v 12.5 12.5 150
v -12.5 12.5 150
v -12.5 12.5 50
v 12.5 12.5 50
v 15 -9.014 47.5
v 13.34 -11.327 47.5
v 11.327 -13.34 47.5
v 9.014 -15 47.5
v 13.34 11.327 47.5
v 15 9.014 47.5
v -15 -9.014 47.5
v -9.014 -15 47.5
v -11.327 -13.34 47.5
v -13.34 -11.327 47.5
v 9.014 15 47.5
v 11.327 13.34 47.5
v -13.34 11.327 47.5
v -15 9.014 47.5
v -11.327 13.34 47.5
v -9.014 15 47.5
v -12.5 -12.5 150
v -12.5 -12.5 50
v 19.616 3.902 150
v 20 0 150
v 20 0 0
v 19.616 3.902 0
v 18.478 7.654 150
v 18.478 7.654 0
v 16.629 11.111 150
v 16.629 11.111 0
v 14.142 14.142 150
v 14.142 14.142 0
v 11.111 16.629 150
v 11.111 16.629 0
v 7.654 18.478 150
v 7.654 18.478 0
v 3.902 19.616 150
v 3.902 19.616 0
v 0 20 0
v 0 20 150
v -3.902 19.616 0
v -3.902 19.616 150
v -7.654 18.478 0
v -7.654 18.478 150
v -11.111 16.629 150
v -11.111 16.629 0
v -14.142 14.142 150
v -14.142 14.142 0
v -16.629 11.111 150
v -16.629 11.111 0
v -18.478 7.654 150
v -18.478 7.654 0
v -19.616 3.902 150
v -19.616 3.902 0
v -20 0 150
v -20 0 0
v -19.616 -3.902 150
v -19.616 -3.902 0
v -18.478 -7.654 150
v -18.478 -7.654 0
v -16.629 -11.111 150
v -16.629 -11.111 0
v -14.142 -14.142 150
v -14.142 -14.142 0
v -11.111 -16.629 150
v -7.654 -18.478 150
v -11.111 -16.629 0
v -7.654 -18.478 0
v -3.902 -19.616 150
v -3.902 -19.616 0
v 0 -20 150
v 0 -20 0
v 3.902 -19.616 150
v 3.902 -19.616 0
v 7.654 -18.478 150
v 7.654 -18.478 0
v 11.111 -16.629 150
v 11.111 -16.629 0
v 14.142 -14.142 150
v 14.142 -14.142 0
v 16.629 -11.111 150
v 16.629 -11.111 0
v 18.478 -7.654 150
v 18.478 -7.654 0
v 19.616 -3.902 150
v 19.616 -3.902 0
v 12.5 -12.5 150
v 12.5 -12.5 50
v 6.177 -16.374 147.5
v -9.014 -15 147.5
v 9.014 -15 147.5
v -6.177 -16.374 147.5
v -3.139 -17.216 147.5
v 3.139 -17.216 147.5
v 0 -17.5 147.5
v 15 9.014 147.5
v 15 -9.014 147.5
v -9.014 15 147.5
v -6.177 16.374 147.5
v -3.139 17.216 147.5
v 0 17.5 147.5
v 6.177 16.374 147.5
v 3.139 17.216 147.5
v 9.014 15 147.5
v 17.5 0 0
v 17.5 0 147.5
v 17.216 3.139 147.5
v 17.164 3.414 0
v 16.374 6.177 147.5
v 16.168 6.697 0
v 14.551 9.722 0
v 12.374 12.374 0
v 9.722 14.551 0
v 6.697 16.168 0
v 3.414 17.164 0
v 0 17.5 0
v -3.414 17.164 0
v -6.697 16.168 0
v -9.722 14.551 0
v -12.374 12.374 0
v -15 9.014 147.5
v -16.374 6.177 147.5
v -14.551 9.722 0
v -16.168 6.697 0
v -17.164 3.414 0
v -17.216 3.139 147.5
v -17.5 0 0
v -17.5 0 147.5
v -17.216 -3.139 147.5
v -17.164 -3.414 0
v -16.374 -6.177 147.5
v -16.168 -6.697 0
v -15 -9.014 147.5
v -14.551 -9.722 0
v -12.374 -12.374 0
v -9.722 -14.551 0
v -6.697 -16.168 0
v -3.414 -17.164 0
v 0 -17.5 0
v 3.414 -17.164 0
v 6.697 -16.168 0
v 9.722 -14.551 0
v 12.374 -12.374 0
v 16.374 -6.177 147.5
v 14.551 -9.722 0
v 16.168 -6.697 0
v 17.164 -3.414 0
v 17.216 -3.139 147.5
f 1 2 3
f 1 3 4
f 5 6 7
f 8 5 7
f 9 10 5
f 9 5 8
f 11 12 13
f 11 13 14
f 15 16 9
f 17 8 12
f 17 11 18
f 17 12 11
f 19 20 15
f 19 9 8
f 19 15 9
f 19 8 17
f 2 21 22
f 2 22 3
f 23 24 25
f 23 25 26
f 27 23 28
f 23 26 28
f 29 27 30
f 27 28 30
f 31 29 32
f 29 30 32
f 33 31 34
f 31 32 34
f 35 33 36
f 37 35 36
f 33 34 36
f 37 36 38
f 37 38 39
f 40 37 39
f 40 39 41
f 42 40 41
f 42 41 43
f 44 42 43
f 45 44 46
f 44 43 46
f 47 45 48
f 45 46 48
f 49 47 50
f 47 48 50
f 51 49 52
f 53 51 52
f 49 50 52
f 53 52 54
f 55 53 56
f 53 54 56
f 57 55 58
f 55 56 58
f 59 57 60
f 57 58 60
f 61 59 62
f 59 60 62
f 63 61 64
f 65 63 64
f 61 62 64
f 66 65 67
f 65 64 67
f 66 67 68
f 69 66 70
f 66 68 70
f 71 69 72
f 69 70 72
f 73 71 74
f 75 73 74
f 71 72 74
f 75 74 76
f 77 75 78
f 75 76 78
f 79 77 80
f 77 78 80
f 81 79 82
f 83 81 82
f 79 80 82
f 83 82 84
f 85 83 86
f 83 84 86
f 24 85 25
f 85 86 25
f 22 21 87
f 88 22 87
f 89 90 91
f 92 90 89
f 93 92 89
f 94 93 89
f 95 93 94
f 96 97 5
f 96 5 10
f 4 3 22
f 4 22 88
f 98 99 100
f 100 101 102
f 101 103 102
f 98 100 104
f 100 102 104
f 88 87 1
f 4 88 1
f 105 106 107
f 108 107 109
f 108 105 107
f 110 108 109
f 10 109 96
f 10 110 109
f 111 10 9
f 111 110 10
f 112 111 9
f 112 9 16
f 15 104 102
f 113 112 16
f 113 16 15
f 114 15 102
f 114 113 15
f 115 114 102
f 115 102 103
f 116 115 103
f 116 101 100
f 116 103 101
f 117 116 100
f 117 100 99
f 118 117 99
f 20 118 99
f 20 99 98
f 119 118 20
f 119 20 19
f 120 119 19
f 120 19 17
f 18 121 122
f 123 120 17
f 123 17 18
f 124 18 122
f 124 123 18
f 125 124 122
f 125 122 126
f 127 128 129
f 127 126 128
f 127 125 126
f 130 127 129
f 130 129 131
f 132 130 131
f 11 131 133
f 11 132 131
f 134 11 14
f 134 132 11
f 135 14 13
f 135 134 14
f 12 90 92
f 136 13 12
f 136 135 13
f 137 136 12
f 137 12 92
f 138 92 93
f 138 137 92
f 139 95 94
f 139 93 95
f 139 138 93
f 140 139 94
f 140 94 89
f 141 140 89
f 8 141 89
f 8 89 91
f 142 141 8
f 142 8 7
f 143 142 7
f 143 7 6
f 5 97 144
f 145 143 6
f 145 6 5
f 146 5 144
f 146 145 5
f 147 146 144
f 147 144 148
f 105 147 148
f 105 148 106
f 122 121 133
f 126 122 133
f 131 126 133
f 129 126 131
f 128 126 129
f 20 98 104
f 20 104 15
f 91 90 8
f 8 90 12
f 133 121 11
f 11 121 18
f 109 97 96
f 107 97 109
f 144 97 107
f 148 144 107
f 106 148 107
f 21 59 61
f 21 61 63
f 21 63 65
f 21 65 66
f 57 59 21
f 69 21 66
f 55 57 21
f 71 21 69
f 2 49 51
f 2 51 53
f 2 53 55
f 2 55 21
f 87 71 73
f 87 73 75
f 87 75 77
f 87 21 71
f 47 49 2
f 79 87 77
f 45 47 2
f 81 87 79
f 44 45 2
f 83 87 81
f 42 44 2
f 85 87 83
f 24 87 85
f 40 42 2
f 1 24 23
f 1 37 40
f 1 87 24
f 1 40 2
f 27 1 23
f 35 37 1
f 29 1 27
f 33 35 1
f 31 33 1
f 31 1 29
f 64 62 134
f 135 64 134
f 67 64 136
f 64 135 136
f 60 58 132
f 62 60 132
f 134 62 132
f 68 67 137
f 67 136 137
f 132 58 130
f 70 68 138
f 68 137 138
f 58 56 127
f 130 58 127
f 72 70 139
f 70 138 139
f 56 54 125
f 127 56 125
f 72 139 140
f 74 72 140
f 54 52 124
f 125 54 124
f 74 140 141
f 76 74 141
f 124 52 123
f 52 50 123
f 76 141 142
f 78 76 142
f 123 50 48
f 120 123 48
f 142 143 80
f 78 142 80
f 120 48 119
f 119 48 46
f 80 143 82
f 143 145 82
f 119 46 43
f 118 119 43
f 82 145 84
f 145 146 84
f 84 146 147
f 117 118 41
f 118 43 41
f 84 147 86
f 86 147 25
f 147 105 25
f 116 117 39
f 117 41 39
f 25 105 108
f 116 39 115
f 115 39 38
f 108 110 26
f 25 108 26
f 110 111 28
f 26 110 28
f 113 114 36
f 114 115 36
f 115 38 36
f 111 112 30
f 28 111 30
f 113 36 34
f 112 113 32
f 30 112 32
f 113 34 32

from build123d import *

# Parameters (mm, degrees)
F0_R        = 20
F0_R_2      = 7.5
F1_DEPTH    = 150
F2_W        = 25
F2_H        = 25
F3_DEPTH    = 100
F4_T        = 2.5
F4_T3_DEPTH = 105
F4_T5_DEPTH = 30
F4_T7_DEPTH = 30


# Not quite as in the source:
# - a shell that OpenCascade refuses in one call is made with other operations: the cavity is built on its own and cut out
# - a feature names something its author has since deleted; it is built from what else it names


with BuildPart() as f1:
    # F0 (on Top) → F1 (new body)
    with BuildSketch(Plane.XY):
        Circle(F0_R)
        Circle(F0_R_2, mode=Mode.SUBTRACT)
        Circle(F0_R_2)
    extrude(amount=F1_DEPTH)

    # F2 (on face) → F3 (cut)
    with BuildSketch(Plane.XY.offset(150)):
        Rectangle(F2_W, F2_H)
    extrude(amount=-F3_DEPTH, mode=Mode.SUBTRACT)

    # F4: shell of thickness 2.5, made by hand


with BuildPart() as f4_core1:
    # F4_t2: copy of F1
    add(f1.part)

    # the walls: a layer under each face that stays
    f4_faces = [f4_core1.faces().sort_by_distance(p)[0] for p in [
        (-20, 0, 75),
        (-13.3333333333, -13.3333333333, 150),
        (-12.5, 0, 100),
        (0, -12.5, 100),
        (12.5, 0, 100),
        (0, 12.5, 100),
        (0, 0, 50),
    ]]
    thicken(f4_faces, amount=-F4_T, mode=Mode.SUBTRACT)

    # F4_s4 → F4_t3 (cut)
    with BuildSketch(Plane.XY.offset(47.5)):
        Polygon((-12.475, 12.475), (-15, 12.5), (-15, 15), (-12.5, 15), align=None)
        Polygon((-12.475, -12.475), (-15, -12.5), (-15, -15), (-12.5, -15), align=None)
        Polygon((12.475, -12.475), (12.5, -15), (15, -15), (15, -12.5), align=None)
        Polygon((12.475, 12.475), (15, 12.5), (15, 15), (12.5, 15), align=None)
    extrude(amount=F4_T3_DEPTH, mode=Mode.SUBTRACT)

    # F4_s6 → F4_t5 (cut)
    with BuildSketch(Plane.XZ.offset(-15)):
        Polygon((-12.475, 50.025), (-15, 50), (-15, 47.5), (-12.5, 47.5), align=None)
        Polygon((12.475, 50.025), (15, 50), (15, 47.5), (12.5, 47.5), align=None)
    extrude(amount=F4_T5_DEPTH, mode=Mode.SUBTRACT)

    # F4_s8 → F4_t7 (cut)
    with BuildSketch(Plane.YZ.offset(-15)):
        Polygon((-12.475, 50.025), (-15, 50), (-15, 47.5), (-12.5, 47.5), align=None)
        Polygon((12.475, 50.025), (15, 50), (15, 47.5), (12.5, 47.5), align=None)
    extrude(amount=F4_T7_DEPTH, mode=Mode.SUBTRACT)


with BuildPart() as f1_1:
    add(f1.part)

    # what is left inside the walls is the cavity
    f4_cavity = [f4_core1.part.solids().sort_by_distance(p)[0] for p in [
        (-17.475, 0, 98.333333),
    ]]
    add(f4_cavity, mode=Mode.SUBTRACT)


solid = f1_1.part
